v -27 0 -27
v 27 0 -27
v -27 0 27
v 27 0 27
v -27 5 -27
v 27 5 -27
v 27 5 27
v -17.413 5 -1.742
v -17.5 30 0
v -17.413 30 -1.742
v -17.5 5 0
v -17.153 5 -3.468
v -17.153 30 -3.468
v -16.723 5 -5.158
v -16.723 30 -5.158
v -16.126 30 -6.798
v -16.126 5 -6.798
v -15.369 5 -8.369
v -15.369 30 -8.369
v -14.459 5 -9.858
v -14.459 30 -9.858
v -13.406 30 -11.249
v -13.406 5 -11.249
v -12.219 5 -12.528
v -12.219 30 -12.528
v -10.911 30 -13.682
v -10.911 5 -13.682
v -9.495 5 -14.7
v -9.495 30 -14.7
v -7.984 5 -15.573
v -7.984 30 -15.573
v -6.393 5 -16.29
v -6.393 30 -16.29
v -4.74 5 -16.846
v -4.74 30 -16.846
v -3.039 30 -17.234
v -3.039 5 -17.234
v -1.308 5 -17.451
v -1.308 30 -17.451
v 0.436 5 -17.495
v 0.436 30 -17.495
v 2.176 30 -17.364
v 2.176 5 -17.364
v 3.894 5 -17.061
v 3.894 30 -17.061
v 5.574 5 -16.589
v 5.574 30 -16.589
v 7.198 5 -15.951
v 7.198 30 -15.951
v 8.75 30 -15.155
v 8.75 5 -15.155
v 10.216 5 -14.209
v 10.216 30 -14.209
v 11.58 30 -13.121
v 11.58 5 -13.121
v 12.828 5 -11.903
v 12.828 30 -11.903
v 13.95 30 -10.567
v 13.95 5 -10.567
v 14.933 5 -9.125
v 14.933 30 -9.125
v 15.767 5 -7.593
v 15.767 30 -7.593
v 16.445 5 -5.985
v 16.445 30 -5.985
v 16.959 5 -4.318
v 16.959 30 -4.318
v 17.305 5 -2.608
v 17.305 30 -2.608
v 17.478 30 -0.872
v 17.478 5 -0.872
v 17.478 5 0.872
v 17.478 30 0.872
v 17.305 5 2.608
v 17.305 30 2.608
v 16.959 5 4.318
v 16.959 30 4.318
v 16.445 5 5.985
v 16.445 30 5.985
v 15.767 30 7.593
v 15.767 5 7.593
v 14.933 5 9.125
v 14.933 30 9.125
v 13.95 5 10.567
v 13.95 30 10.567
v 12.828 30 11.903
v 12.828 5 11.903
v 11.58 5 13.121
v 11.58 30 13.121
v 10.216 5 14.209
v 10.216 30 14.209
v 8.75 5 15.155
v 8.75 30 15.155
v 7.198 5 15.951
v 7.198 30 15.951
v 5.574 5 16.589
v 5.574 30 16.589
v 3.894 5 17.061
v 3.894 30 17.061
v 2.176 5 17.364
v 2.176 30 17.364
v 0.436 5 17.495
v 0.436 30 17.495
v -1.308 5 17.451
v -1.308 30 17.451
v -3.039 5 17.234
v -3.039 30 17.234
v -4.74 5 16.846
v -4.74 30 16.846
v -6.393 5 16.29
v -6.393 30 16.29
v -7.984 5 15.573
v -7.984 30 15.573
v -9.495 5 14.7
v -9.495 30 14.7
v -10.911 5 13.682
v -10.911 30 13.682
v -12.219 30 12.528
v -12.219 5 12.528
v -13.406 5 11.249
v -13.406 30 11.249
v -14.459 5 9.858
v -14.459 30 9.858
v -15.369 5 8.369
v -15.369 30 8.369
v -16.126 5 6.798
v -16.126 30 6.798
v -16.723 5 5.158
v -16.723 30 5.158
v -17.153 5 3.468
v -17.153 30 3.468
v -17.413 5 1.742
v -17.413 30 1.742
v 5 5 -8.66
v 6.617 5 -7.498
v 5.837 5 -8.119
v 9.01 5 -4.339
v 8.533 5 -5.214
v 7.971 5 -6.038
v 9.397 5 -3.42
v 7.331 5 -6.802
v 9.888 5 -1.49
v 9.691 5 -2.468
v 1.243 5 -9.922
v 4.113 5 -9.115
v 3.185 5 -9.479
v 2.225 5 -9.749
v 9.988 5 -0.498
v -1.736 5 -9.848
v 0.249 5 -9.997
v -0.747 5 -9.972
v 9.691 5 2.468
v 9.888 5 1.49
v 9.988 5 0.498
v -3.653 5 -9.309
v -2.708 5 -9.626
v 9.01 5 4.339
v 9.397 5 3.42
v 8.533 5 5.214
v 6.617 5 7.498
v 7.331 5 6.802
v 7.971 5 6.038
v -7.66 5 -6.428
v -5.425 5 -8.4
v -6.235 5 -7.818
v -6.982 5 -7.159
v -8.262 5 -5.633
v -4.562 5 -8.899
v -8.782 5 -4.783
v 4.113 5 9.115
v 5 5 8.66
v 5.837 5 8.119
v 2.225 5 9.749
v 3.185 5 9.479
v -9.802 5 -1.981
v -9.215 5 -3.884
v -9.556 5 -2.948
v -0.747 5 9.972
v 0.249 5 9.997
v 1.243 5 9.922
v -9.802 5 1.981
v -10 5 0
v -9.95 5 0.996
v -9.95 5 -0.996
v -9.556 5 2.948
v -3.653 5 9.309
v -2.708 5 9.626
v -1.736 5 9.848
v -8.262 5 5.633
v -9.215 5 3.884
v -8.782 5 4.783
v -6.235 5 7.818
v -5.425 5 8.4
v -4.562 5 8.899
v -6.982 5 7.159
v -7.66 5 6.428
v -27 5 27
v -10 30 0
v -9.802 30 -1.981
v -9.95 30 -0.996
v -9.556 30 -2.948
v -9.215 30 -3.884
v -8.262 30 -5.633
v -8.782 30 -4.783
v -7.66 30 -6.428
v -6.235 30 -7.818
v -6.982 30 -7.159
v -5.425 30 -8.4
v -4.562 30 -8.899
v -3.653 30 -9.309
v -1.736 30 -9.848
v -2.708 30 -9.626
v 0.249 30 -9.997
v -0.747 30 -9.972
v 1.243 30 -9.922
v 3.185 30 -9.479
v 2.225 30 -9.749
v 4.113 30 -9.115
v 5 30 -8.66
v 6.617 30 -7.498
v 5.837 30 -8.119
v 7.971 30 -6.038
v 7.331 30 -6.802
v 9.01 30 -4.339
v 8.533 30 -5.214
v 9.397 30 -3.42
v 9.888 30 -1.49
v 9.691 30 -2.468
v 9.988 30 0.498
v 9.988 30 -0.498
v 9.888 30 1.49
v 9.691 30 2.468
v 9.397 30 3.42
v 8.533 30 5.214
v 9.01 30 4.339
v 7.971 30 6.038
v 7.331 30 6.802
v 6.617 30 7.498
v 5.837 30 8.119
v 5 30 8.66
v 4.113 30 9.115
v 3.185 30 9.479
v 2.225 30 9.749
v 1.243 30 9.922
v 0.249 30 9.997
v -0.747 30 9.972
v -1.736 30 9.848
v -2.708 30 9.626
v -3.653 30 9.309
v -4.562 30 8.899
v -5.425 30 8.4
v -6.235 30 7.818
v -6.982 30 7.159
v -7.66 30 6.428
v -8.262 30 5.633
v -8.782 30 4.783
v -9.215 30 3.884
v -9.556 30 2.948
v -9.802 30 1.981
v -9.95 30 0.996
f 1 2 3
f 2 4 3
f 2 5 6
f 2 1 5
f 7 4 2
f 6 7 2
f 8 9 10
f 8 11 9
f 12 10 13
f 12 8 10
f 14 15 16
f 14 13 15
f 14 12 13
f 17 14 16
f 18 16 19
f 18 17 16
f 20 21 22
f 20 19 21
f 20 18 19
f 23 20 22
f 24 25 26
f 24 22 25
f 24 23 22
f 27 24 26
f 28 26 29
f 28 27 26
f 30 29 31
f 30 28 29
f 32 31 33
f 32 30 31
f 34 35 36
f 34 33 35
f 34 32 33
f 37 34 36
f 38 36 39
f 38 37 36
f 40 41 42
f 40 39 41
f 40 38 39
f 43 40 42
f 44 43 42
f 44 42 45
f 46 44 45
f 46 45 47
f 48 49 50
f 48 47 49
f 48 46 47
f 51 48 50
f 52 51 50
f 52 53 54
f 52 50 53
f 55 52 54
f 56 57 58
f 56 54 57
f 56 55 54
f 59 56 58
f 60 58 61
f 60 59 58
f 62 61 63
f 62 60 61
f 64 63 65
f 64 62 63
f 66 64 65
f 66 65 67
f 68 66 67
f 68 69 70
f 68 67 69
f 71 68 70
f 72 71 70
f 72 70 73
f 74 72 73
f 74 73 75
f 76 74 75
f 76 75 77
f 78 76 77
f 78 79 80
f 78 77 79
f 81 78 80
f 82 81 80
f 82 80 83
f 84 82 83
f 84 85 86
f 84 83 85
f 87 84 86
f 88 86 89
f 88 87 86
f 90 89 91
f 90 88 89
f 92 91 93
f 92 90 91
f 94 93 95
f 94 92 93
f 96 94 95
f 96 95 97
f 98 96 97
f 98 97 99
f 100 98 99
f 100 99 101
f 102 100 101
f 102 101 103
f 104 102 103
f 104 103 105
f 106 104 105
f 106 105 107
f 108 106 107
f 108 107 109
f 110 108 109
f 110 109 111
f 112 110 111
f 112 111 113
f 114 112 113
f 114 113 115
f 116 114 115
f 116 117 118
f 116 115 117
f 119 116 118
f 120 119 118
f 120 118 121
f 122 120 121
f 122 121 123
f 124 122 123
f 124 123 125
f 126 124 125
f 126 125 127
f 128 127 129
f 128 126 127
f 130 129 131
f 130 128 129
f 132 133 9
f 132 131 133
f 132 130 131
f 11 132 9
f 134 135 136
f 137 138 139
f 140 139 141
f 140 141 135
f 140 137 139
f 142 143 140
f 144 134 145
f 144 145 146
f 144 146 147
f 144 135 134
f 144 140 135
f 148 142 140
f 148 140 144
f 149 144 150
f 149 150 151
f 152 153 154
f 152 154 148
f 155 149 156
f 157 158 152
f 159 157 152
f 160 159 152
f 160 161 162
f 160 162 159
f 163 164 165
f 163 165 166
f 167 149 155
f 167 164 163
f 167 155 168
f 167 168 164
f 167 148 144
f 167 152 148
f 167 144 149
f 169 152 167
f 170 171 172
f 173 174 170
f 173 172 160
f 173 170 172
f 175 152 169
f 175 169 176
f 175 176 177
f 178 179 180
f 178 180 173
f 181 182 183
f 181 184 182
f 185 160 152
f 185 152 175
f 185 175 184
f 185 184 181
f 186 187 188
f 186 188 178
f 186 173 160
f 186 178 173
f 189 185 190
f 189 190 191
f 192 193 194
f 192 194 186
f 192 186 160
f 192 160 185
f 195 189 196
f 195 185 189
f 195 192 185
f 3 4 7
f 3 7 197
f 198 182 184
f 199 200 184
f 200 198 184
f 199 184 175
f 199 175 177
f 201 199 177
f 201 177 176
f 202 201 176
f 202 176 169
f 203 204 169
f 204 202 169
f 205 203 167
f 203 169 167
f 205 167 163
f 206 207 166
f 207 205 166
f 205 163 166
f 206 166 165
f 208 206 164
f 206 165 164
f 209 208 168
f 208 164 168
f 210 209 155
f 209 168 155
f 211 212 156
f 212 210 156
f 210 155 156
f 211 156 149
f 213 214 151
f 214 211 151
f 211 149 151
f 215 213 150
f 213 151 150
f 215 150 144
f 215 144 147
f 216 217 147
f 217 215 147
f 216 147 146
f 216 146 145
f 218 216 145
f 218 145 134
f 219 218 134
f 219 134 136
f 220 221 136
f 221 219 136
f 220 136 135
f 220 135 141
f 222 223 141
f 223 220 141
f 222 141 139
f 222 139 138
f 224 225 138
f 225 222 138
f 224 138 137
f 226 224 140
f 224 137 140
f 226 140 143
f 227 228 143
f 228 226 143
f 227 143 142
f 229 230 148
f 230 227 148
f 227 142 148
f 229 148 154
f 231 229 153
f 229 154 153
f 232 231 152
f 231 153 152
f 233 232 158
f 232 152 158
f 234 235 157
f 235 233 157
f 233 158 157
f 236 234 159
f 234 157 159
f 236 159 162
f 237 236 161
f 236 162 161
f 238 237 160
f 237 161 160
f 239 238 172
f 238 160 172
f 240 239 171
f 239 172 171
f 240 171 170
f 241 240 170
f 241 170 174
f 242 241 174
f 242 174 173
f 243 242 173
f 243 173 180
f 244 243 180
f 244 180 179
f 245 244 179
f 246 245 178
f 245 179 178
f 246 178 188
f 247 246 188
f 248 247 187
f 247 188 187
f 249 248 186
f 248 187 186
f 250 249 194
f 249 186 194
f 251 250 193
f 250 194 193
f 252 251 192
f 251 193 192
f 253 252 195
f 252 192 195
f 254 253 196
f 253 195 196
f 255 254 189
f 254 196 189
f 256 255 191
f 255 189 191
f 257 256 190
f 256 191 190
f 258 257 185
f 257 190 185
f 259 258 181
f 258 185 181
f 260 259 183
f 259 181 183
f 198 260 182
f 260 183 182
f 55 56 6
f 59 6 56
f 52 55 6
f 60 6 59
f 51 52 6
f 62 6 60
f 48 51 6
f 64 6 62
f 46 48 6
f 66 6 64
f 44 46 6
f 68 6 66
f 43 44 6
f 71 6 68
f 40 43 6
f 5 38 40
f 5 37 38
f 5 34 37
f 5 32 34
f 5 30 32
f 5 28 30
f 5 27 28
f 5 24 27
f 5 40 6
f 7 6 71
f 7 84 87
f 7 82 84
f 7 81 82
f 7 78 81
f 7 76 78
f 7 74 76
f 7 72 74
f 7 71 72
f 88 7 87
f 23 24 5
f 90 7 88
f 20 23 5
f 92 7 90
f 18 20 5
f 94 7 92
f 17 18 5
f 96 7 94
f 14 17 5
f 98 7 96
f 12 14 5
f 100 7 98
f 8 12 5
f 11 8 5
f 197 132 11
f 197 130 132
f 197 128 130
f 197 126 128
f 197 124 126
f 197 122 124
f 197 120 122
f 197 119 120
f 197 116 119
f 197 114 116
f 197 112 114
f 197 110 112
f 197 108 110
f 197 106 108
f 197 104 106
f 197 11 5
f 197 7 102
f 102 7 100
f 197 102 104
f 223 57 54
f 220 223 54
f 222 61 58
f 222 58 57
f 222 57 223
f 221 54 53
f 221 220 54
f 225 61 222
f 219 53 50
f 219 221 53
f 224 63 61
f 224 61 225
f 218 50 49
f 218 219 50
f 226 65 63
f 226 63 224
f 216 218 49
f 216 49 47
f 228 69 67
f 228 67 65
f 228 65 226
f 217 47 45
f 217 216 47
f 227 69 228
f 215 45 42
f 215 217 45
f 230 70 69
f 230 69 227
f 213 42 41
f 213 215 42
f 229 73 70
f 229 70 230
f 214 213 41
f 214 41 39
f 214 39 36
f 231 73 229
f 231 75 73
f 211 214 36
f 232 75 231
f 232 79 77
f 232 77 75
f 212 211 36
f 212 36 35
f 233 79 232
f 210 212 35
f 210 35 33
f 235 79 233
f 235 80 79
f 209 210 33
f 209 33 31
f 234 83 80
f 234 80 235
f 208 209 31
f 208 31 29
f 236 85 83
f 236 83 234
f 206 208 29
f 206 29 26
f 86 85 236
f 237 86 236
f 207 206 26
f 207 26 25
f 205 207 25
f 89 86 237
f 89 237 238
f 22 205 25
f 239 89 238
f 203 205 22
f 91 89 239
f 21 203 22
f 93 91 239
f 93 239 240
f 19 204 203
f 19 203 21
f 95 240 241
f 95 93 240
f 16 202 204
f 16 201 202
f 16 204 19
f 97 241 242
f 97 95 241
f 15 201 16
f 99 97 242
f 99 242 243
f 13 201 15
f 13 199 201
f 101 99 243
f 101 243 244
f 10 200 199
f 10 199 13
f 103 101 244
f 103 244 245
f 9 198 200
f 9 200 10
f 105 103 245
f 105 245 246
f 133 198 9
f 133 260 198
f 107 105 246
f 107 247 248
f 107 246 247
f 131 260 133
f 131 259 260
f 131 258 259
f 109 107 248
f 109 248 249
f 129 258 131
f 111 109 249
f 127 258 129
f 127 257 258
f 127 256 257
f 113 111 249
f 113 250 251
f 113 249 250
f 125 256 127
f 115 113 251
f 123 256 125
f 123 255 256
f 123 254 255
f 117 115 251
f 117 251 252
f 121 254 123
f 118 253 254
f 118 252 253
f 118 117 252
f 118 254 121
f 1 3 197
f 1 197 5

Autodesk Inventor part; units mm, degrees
ref_plane "YZ Plane" through (0, 0, 0) normal (1, 0, 0) x (0, 1, 0)
ref_plane "XZ Plane" through (0, 0, 0) normal (0, 1, 0) x (-1, 0, 0)
ref_plane "XY Plane" through (0, 0, 0) normal (0, 0, 1) x (1, 0, 0)
sketch "Szkic1" plane through (0, 0, 0) normal (0, 1, 0) x (-1, 0, 0)
  circle A0 centre (0, 0) radius 10
  line L0 (27, 0) -> (27, -27)
  line L1 (27, -27) -> (0, -27)
  line L2 (27, 0) -> (27, 27)
  line L3 (27, 27) -> (0, 27)
  line L4 (-27, 0) -> (-27, -27)
  line L5 (-27, -27) -> (0, -27)
  line L6 (-27, 0) -> (-27, 27)
  line L7 (-27, 27) -> (0, 27)
  circle A1 centre (0, 0) radius 17.5
  dimension "d0" = 20
  dimension "d6" = 54
  dimension "d7" = 54
  dimension "d8" = 35
extrude "Wyciągnięcie proste1" add sketch "Szkic1" along normal blind 5
extrude "Wyciągnięcie proste2" add sketch "Szkic1" along normal blind 30 contours A1
properties part number "kapek"
